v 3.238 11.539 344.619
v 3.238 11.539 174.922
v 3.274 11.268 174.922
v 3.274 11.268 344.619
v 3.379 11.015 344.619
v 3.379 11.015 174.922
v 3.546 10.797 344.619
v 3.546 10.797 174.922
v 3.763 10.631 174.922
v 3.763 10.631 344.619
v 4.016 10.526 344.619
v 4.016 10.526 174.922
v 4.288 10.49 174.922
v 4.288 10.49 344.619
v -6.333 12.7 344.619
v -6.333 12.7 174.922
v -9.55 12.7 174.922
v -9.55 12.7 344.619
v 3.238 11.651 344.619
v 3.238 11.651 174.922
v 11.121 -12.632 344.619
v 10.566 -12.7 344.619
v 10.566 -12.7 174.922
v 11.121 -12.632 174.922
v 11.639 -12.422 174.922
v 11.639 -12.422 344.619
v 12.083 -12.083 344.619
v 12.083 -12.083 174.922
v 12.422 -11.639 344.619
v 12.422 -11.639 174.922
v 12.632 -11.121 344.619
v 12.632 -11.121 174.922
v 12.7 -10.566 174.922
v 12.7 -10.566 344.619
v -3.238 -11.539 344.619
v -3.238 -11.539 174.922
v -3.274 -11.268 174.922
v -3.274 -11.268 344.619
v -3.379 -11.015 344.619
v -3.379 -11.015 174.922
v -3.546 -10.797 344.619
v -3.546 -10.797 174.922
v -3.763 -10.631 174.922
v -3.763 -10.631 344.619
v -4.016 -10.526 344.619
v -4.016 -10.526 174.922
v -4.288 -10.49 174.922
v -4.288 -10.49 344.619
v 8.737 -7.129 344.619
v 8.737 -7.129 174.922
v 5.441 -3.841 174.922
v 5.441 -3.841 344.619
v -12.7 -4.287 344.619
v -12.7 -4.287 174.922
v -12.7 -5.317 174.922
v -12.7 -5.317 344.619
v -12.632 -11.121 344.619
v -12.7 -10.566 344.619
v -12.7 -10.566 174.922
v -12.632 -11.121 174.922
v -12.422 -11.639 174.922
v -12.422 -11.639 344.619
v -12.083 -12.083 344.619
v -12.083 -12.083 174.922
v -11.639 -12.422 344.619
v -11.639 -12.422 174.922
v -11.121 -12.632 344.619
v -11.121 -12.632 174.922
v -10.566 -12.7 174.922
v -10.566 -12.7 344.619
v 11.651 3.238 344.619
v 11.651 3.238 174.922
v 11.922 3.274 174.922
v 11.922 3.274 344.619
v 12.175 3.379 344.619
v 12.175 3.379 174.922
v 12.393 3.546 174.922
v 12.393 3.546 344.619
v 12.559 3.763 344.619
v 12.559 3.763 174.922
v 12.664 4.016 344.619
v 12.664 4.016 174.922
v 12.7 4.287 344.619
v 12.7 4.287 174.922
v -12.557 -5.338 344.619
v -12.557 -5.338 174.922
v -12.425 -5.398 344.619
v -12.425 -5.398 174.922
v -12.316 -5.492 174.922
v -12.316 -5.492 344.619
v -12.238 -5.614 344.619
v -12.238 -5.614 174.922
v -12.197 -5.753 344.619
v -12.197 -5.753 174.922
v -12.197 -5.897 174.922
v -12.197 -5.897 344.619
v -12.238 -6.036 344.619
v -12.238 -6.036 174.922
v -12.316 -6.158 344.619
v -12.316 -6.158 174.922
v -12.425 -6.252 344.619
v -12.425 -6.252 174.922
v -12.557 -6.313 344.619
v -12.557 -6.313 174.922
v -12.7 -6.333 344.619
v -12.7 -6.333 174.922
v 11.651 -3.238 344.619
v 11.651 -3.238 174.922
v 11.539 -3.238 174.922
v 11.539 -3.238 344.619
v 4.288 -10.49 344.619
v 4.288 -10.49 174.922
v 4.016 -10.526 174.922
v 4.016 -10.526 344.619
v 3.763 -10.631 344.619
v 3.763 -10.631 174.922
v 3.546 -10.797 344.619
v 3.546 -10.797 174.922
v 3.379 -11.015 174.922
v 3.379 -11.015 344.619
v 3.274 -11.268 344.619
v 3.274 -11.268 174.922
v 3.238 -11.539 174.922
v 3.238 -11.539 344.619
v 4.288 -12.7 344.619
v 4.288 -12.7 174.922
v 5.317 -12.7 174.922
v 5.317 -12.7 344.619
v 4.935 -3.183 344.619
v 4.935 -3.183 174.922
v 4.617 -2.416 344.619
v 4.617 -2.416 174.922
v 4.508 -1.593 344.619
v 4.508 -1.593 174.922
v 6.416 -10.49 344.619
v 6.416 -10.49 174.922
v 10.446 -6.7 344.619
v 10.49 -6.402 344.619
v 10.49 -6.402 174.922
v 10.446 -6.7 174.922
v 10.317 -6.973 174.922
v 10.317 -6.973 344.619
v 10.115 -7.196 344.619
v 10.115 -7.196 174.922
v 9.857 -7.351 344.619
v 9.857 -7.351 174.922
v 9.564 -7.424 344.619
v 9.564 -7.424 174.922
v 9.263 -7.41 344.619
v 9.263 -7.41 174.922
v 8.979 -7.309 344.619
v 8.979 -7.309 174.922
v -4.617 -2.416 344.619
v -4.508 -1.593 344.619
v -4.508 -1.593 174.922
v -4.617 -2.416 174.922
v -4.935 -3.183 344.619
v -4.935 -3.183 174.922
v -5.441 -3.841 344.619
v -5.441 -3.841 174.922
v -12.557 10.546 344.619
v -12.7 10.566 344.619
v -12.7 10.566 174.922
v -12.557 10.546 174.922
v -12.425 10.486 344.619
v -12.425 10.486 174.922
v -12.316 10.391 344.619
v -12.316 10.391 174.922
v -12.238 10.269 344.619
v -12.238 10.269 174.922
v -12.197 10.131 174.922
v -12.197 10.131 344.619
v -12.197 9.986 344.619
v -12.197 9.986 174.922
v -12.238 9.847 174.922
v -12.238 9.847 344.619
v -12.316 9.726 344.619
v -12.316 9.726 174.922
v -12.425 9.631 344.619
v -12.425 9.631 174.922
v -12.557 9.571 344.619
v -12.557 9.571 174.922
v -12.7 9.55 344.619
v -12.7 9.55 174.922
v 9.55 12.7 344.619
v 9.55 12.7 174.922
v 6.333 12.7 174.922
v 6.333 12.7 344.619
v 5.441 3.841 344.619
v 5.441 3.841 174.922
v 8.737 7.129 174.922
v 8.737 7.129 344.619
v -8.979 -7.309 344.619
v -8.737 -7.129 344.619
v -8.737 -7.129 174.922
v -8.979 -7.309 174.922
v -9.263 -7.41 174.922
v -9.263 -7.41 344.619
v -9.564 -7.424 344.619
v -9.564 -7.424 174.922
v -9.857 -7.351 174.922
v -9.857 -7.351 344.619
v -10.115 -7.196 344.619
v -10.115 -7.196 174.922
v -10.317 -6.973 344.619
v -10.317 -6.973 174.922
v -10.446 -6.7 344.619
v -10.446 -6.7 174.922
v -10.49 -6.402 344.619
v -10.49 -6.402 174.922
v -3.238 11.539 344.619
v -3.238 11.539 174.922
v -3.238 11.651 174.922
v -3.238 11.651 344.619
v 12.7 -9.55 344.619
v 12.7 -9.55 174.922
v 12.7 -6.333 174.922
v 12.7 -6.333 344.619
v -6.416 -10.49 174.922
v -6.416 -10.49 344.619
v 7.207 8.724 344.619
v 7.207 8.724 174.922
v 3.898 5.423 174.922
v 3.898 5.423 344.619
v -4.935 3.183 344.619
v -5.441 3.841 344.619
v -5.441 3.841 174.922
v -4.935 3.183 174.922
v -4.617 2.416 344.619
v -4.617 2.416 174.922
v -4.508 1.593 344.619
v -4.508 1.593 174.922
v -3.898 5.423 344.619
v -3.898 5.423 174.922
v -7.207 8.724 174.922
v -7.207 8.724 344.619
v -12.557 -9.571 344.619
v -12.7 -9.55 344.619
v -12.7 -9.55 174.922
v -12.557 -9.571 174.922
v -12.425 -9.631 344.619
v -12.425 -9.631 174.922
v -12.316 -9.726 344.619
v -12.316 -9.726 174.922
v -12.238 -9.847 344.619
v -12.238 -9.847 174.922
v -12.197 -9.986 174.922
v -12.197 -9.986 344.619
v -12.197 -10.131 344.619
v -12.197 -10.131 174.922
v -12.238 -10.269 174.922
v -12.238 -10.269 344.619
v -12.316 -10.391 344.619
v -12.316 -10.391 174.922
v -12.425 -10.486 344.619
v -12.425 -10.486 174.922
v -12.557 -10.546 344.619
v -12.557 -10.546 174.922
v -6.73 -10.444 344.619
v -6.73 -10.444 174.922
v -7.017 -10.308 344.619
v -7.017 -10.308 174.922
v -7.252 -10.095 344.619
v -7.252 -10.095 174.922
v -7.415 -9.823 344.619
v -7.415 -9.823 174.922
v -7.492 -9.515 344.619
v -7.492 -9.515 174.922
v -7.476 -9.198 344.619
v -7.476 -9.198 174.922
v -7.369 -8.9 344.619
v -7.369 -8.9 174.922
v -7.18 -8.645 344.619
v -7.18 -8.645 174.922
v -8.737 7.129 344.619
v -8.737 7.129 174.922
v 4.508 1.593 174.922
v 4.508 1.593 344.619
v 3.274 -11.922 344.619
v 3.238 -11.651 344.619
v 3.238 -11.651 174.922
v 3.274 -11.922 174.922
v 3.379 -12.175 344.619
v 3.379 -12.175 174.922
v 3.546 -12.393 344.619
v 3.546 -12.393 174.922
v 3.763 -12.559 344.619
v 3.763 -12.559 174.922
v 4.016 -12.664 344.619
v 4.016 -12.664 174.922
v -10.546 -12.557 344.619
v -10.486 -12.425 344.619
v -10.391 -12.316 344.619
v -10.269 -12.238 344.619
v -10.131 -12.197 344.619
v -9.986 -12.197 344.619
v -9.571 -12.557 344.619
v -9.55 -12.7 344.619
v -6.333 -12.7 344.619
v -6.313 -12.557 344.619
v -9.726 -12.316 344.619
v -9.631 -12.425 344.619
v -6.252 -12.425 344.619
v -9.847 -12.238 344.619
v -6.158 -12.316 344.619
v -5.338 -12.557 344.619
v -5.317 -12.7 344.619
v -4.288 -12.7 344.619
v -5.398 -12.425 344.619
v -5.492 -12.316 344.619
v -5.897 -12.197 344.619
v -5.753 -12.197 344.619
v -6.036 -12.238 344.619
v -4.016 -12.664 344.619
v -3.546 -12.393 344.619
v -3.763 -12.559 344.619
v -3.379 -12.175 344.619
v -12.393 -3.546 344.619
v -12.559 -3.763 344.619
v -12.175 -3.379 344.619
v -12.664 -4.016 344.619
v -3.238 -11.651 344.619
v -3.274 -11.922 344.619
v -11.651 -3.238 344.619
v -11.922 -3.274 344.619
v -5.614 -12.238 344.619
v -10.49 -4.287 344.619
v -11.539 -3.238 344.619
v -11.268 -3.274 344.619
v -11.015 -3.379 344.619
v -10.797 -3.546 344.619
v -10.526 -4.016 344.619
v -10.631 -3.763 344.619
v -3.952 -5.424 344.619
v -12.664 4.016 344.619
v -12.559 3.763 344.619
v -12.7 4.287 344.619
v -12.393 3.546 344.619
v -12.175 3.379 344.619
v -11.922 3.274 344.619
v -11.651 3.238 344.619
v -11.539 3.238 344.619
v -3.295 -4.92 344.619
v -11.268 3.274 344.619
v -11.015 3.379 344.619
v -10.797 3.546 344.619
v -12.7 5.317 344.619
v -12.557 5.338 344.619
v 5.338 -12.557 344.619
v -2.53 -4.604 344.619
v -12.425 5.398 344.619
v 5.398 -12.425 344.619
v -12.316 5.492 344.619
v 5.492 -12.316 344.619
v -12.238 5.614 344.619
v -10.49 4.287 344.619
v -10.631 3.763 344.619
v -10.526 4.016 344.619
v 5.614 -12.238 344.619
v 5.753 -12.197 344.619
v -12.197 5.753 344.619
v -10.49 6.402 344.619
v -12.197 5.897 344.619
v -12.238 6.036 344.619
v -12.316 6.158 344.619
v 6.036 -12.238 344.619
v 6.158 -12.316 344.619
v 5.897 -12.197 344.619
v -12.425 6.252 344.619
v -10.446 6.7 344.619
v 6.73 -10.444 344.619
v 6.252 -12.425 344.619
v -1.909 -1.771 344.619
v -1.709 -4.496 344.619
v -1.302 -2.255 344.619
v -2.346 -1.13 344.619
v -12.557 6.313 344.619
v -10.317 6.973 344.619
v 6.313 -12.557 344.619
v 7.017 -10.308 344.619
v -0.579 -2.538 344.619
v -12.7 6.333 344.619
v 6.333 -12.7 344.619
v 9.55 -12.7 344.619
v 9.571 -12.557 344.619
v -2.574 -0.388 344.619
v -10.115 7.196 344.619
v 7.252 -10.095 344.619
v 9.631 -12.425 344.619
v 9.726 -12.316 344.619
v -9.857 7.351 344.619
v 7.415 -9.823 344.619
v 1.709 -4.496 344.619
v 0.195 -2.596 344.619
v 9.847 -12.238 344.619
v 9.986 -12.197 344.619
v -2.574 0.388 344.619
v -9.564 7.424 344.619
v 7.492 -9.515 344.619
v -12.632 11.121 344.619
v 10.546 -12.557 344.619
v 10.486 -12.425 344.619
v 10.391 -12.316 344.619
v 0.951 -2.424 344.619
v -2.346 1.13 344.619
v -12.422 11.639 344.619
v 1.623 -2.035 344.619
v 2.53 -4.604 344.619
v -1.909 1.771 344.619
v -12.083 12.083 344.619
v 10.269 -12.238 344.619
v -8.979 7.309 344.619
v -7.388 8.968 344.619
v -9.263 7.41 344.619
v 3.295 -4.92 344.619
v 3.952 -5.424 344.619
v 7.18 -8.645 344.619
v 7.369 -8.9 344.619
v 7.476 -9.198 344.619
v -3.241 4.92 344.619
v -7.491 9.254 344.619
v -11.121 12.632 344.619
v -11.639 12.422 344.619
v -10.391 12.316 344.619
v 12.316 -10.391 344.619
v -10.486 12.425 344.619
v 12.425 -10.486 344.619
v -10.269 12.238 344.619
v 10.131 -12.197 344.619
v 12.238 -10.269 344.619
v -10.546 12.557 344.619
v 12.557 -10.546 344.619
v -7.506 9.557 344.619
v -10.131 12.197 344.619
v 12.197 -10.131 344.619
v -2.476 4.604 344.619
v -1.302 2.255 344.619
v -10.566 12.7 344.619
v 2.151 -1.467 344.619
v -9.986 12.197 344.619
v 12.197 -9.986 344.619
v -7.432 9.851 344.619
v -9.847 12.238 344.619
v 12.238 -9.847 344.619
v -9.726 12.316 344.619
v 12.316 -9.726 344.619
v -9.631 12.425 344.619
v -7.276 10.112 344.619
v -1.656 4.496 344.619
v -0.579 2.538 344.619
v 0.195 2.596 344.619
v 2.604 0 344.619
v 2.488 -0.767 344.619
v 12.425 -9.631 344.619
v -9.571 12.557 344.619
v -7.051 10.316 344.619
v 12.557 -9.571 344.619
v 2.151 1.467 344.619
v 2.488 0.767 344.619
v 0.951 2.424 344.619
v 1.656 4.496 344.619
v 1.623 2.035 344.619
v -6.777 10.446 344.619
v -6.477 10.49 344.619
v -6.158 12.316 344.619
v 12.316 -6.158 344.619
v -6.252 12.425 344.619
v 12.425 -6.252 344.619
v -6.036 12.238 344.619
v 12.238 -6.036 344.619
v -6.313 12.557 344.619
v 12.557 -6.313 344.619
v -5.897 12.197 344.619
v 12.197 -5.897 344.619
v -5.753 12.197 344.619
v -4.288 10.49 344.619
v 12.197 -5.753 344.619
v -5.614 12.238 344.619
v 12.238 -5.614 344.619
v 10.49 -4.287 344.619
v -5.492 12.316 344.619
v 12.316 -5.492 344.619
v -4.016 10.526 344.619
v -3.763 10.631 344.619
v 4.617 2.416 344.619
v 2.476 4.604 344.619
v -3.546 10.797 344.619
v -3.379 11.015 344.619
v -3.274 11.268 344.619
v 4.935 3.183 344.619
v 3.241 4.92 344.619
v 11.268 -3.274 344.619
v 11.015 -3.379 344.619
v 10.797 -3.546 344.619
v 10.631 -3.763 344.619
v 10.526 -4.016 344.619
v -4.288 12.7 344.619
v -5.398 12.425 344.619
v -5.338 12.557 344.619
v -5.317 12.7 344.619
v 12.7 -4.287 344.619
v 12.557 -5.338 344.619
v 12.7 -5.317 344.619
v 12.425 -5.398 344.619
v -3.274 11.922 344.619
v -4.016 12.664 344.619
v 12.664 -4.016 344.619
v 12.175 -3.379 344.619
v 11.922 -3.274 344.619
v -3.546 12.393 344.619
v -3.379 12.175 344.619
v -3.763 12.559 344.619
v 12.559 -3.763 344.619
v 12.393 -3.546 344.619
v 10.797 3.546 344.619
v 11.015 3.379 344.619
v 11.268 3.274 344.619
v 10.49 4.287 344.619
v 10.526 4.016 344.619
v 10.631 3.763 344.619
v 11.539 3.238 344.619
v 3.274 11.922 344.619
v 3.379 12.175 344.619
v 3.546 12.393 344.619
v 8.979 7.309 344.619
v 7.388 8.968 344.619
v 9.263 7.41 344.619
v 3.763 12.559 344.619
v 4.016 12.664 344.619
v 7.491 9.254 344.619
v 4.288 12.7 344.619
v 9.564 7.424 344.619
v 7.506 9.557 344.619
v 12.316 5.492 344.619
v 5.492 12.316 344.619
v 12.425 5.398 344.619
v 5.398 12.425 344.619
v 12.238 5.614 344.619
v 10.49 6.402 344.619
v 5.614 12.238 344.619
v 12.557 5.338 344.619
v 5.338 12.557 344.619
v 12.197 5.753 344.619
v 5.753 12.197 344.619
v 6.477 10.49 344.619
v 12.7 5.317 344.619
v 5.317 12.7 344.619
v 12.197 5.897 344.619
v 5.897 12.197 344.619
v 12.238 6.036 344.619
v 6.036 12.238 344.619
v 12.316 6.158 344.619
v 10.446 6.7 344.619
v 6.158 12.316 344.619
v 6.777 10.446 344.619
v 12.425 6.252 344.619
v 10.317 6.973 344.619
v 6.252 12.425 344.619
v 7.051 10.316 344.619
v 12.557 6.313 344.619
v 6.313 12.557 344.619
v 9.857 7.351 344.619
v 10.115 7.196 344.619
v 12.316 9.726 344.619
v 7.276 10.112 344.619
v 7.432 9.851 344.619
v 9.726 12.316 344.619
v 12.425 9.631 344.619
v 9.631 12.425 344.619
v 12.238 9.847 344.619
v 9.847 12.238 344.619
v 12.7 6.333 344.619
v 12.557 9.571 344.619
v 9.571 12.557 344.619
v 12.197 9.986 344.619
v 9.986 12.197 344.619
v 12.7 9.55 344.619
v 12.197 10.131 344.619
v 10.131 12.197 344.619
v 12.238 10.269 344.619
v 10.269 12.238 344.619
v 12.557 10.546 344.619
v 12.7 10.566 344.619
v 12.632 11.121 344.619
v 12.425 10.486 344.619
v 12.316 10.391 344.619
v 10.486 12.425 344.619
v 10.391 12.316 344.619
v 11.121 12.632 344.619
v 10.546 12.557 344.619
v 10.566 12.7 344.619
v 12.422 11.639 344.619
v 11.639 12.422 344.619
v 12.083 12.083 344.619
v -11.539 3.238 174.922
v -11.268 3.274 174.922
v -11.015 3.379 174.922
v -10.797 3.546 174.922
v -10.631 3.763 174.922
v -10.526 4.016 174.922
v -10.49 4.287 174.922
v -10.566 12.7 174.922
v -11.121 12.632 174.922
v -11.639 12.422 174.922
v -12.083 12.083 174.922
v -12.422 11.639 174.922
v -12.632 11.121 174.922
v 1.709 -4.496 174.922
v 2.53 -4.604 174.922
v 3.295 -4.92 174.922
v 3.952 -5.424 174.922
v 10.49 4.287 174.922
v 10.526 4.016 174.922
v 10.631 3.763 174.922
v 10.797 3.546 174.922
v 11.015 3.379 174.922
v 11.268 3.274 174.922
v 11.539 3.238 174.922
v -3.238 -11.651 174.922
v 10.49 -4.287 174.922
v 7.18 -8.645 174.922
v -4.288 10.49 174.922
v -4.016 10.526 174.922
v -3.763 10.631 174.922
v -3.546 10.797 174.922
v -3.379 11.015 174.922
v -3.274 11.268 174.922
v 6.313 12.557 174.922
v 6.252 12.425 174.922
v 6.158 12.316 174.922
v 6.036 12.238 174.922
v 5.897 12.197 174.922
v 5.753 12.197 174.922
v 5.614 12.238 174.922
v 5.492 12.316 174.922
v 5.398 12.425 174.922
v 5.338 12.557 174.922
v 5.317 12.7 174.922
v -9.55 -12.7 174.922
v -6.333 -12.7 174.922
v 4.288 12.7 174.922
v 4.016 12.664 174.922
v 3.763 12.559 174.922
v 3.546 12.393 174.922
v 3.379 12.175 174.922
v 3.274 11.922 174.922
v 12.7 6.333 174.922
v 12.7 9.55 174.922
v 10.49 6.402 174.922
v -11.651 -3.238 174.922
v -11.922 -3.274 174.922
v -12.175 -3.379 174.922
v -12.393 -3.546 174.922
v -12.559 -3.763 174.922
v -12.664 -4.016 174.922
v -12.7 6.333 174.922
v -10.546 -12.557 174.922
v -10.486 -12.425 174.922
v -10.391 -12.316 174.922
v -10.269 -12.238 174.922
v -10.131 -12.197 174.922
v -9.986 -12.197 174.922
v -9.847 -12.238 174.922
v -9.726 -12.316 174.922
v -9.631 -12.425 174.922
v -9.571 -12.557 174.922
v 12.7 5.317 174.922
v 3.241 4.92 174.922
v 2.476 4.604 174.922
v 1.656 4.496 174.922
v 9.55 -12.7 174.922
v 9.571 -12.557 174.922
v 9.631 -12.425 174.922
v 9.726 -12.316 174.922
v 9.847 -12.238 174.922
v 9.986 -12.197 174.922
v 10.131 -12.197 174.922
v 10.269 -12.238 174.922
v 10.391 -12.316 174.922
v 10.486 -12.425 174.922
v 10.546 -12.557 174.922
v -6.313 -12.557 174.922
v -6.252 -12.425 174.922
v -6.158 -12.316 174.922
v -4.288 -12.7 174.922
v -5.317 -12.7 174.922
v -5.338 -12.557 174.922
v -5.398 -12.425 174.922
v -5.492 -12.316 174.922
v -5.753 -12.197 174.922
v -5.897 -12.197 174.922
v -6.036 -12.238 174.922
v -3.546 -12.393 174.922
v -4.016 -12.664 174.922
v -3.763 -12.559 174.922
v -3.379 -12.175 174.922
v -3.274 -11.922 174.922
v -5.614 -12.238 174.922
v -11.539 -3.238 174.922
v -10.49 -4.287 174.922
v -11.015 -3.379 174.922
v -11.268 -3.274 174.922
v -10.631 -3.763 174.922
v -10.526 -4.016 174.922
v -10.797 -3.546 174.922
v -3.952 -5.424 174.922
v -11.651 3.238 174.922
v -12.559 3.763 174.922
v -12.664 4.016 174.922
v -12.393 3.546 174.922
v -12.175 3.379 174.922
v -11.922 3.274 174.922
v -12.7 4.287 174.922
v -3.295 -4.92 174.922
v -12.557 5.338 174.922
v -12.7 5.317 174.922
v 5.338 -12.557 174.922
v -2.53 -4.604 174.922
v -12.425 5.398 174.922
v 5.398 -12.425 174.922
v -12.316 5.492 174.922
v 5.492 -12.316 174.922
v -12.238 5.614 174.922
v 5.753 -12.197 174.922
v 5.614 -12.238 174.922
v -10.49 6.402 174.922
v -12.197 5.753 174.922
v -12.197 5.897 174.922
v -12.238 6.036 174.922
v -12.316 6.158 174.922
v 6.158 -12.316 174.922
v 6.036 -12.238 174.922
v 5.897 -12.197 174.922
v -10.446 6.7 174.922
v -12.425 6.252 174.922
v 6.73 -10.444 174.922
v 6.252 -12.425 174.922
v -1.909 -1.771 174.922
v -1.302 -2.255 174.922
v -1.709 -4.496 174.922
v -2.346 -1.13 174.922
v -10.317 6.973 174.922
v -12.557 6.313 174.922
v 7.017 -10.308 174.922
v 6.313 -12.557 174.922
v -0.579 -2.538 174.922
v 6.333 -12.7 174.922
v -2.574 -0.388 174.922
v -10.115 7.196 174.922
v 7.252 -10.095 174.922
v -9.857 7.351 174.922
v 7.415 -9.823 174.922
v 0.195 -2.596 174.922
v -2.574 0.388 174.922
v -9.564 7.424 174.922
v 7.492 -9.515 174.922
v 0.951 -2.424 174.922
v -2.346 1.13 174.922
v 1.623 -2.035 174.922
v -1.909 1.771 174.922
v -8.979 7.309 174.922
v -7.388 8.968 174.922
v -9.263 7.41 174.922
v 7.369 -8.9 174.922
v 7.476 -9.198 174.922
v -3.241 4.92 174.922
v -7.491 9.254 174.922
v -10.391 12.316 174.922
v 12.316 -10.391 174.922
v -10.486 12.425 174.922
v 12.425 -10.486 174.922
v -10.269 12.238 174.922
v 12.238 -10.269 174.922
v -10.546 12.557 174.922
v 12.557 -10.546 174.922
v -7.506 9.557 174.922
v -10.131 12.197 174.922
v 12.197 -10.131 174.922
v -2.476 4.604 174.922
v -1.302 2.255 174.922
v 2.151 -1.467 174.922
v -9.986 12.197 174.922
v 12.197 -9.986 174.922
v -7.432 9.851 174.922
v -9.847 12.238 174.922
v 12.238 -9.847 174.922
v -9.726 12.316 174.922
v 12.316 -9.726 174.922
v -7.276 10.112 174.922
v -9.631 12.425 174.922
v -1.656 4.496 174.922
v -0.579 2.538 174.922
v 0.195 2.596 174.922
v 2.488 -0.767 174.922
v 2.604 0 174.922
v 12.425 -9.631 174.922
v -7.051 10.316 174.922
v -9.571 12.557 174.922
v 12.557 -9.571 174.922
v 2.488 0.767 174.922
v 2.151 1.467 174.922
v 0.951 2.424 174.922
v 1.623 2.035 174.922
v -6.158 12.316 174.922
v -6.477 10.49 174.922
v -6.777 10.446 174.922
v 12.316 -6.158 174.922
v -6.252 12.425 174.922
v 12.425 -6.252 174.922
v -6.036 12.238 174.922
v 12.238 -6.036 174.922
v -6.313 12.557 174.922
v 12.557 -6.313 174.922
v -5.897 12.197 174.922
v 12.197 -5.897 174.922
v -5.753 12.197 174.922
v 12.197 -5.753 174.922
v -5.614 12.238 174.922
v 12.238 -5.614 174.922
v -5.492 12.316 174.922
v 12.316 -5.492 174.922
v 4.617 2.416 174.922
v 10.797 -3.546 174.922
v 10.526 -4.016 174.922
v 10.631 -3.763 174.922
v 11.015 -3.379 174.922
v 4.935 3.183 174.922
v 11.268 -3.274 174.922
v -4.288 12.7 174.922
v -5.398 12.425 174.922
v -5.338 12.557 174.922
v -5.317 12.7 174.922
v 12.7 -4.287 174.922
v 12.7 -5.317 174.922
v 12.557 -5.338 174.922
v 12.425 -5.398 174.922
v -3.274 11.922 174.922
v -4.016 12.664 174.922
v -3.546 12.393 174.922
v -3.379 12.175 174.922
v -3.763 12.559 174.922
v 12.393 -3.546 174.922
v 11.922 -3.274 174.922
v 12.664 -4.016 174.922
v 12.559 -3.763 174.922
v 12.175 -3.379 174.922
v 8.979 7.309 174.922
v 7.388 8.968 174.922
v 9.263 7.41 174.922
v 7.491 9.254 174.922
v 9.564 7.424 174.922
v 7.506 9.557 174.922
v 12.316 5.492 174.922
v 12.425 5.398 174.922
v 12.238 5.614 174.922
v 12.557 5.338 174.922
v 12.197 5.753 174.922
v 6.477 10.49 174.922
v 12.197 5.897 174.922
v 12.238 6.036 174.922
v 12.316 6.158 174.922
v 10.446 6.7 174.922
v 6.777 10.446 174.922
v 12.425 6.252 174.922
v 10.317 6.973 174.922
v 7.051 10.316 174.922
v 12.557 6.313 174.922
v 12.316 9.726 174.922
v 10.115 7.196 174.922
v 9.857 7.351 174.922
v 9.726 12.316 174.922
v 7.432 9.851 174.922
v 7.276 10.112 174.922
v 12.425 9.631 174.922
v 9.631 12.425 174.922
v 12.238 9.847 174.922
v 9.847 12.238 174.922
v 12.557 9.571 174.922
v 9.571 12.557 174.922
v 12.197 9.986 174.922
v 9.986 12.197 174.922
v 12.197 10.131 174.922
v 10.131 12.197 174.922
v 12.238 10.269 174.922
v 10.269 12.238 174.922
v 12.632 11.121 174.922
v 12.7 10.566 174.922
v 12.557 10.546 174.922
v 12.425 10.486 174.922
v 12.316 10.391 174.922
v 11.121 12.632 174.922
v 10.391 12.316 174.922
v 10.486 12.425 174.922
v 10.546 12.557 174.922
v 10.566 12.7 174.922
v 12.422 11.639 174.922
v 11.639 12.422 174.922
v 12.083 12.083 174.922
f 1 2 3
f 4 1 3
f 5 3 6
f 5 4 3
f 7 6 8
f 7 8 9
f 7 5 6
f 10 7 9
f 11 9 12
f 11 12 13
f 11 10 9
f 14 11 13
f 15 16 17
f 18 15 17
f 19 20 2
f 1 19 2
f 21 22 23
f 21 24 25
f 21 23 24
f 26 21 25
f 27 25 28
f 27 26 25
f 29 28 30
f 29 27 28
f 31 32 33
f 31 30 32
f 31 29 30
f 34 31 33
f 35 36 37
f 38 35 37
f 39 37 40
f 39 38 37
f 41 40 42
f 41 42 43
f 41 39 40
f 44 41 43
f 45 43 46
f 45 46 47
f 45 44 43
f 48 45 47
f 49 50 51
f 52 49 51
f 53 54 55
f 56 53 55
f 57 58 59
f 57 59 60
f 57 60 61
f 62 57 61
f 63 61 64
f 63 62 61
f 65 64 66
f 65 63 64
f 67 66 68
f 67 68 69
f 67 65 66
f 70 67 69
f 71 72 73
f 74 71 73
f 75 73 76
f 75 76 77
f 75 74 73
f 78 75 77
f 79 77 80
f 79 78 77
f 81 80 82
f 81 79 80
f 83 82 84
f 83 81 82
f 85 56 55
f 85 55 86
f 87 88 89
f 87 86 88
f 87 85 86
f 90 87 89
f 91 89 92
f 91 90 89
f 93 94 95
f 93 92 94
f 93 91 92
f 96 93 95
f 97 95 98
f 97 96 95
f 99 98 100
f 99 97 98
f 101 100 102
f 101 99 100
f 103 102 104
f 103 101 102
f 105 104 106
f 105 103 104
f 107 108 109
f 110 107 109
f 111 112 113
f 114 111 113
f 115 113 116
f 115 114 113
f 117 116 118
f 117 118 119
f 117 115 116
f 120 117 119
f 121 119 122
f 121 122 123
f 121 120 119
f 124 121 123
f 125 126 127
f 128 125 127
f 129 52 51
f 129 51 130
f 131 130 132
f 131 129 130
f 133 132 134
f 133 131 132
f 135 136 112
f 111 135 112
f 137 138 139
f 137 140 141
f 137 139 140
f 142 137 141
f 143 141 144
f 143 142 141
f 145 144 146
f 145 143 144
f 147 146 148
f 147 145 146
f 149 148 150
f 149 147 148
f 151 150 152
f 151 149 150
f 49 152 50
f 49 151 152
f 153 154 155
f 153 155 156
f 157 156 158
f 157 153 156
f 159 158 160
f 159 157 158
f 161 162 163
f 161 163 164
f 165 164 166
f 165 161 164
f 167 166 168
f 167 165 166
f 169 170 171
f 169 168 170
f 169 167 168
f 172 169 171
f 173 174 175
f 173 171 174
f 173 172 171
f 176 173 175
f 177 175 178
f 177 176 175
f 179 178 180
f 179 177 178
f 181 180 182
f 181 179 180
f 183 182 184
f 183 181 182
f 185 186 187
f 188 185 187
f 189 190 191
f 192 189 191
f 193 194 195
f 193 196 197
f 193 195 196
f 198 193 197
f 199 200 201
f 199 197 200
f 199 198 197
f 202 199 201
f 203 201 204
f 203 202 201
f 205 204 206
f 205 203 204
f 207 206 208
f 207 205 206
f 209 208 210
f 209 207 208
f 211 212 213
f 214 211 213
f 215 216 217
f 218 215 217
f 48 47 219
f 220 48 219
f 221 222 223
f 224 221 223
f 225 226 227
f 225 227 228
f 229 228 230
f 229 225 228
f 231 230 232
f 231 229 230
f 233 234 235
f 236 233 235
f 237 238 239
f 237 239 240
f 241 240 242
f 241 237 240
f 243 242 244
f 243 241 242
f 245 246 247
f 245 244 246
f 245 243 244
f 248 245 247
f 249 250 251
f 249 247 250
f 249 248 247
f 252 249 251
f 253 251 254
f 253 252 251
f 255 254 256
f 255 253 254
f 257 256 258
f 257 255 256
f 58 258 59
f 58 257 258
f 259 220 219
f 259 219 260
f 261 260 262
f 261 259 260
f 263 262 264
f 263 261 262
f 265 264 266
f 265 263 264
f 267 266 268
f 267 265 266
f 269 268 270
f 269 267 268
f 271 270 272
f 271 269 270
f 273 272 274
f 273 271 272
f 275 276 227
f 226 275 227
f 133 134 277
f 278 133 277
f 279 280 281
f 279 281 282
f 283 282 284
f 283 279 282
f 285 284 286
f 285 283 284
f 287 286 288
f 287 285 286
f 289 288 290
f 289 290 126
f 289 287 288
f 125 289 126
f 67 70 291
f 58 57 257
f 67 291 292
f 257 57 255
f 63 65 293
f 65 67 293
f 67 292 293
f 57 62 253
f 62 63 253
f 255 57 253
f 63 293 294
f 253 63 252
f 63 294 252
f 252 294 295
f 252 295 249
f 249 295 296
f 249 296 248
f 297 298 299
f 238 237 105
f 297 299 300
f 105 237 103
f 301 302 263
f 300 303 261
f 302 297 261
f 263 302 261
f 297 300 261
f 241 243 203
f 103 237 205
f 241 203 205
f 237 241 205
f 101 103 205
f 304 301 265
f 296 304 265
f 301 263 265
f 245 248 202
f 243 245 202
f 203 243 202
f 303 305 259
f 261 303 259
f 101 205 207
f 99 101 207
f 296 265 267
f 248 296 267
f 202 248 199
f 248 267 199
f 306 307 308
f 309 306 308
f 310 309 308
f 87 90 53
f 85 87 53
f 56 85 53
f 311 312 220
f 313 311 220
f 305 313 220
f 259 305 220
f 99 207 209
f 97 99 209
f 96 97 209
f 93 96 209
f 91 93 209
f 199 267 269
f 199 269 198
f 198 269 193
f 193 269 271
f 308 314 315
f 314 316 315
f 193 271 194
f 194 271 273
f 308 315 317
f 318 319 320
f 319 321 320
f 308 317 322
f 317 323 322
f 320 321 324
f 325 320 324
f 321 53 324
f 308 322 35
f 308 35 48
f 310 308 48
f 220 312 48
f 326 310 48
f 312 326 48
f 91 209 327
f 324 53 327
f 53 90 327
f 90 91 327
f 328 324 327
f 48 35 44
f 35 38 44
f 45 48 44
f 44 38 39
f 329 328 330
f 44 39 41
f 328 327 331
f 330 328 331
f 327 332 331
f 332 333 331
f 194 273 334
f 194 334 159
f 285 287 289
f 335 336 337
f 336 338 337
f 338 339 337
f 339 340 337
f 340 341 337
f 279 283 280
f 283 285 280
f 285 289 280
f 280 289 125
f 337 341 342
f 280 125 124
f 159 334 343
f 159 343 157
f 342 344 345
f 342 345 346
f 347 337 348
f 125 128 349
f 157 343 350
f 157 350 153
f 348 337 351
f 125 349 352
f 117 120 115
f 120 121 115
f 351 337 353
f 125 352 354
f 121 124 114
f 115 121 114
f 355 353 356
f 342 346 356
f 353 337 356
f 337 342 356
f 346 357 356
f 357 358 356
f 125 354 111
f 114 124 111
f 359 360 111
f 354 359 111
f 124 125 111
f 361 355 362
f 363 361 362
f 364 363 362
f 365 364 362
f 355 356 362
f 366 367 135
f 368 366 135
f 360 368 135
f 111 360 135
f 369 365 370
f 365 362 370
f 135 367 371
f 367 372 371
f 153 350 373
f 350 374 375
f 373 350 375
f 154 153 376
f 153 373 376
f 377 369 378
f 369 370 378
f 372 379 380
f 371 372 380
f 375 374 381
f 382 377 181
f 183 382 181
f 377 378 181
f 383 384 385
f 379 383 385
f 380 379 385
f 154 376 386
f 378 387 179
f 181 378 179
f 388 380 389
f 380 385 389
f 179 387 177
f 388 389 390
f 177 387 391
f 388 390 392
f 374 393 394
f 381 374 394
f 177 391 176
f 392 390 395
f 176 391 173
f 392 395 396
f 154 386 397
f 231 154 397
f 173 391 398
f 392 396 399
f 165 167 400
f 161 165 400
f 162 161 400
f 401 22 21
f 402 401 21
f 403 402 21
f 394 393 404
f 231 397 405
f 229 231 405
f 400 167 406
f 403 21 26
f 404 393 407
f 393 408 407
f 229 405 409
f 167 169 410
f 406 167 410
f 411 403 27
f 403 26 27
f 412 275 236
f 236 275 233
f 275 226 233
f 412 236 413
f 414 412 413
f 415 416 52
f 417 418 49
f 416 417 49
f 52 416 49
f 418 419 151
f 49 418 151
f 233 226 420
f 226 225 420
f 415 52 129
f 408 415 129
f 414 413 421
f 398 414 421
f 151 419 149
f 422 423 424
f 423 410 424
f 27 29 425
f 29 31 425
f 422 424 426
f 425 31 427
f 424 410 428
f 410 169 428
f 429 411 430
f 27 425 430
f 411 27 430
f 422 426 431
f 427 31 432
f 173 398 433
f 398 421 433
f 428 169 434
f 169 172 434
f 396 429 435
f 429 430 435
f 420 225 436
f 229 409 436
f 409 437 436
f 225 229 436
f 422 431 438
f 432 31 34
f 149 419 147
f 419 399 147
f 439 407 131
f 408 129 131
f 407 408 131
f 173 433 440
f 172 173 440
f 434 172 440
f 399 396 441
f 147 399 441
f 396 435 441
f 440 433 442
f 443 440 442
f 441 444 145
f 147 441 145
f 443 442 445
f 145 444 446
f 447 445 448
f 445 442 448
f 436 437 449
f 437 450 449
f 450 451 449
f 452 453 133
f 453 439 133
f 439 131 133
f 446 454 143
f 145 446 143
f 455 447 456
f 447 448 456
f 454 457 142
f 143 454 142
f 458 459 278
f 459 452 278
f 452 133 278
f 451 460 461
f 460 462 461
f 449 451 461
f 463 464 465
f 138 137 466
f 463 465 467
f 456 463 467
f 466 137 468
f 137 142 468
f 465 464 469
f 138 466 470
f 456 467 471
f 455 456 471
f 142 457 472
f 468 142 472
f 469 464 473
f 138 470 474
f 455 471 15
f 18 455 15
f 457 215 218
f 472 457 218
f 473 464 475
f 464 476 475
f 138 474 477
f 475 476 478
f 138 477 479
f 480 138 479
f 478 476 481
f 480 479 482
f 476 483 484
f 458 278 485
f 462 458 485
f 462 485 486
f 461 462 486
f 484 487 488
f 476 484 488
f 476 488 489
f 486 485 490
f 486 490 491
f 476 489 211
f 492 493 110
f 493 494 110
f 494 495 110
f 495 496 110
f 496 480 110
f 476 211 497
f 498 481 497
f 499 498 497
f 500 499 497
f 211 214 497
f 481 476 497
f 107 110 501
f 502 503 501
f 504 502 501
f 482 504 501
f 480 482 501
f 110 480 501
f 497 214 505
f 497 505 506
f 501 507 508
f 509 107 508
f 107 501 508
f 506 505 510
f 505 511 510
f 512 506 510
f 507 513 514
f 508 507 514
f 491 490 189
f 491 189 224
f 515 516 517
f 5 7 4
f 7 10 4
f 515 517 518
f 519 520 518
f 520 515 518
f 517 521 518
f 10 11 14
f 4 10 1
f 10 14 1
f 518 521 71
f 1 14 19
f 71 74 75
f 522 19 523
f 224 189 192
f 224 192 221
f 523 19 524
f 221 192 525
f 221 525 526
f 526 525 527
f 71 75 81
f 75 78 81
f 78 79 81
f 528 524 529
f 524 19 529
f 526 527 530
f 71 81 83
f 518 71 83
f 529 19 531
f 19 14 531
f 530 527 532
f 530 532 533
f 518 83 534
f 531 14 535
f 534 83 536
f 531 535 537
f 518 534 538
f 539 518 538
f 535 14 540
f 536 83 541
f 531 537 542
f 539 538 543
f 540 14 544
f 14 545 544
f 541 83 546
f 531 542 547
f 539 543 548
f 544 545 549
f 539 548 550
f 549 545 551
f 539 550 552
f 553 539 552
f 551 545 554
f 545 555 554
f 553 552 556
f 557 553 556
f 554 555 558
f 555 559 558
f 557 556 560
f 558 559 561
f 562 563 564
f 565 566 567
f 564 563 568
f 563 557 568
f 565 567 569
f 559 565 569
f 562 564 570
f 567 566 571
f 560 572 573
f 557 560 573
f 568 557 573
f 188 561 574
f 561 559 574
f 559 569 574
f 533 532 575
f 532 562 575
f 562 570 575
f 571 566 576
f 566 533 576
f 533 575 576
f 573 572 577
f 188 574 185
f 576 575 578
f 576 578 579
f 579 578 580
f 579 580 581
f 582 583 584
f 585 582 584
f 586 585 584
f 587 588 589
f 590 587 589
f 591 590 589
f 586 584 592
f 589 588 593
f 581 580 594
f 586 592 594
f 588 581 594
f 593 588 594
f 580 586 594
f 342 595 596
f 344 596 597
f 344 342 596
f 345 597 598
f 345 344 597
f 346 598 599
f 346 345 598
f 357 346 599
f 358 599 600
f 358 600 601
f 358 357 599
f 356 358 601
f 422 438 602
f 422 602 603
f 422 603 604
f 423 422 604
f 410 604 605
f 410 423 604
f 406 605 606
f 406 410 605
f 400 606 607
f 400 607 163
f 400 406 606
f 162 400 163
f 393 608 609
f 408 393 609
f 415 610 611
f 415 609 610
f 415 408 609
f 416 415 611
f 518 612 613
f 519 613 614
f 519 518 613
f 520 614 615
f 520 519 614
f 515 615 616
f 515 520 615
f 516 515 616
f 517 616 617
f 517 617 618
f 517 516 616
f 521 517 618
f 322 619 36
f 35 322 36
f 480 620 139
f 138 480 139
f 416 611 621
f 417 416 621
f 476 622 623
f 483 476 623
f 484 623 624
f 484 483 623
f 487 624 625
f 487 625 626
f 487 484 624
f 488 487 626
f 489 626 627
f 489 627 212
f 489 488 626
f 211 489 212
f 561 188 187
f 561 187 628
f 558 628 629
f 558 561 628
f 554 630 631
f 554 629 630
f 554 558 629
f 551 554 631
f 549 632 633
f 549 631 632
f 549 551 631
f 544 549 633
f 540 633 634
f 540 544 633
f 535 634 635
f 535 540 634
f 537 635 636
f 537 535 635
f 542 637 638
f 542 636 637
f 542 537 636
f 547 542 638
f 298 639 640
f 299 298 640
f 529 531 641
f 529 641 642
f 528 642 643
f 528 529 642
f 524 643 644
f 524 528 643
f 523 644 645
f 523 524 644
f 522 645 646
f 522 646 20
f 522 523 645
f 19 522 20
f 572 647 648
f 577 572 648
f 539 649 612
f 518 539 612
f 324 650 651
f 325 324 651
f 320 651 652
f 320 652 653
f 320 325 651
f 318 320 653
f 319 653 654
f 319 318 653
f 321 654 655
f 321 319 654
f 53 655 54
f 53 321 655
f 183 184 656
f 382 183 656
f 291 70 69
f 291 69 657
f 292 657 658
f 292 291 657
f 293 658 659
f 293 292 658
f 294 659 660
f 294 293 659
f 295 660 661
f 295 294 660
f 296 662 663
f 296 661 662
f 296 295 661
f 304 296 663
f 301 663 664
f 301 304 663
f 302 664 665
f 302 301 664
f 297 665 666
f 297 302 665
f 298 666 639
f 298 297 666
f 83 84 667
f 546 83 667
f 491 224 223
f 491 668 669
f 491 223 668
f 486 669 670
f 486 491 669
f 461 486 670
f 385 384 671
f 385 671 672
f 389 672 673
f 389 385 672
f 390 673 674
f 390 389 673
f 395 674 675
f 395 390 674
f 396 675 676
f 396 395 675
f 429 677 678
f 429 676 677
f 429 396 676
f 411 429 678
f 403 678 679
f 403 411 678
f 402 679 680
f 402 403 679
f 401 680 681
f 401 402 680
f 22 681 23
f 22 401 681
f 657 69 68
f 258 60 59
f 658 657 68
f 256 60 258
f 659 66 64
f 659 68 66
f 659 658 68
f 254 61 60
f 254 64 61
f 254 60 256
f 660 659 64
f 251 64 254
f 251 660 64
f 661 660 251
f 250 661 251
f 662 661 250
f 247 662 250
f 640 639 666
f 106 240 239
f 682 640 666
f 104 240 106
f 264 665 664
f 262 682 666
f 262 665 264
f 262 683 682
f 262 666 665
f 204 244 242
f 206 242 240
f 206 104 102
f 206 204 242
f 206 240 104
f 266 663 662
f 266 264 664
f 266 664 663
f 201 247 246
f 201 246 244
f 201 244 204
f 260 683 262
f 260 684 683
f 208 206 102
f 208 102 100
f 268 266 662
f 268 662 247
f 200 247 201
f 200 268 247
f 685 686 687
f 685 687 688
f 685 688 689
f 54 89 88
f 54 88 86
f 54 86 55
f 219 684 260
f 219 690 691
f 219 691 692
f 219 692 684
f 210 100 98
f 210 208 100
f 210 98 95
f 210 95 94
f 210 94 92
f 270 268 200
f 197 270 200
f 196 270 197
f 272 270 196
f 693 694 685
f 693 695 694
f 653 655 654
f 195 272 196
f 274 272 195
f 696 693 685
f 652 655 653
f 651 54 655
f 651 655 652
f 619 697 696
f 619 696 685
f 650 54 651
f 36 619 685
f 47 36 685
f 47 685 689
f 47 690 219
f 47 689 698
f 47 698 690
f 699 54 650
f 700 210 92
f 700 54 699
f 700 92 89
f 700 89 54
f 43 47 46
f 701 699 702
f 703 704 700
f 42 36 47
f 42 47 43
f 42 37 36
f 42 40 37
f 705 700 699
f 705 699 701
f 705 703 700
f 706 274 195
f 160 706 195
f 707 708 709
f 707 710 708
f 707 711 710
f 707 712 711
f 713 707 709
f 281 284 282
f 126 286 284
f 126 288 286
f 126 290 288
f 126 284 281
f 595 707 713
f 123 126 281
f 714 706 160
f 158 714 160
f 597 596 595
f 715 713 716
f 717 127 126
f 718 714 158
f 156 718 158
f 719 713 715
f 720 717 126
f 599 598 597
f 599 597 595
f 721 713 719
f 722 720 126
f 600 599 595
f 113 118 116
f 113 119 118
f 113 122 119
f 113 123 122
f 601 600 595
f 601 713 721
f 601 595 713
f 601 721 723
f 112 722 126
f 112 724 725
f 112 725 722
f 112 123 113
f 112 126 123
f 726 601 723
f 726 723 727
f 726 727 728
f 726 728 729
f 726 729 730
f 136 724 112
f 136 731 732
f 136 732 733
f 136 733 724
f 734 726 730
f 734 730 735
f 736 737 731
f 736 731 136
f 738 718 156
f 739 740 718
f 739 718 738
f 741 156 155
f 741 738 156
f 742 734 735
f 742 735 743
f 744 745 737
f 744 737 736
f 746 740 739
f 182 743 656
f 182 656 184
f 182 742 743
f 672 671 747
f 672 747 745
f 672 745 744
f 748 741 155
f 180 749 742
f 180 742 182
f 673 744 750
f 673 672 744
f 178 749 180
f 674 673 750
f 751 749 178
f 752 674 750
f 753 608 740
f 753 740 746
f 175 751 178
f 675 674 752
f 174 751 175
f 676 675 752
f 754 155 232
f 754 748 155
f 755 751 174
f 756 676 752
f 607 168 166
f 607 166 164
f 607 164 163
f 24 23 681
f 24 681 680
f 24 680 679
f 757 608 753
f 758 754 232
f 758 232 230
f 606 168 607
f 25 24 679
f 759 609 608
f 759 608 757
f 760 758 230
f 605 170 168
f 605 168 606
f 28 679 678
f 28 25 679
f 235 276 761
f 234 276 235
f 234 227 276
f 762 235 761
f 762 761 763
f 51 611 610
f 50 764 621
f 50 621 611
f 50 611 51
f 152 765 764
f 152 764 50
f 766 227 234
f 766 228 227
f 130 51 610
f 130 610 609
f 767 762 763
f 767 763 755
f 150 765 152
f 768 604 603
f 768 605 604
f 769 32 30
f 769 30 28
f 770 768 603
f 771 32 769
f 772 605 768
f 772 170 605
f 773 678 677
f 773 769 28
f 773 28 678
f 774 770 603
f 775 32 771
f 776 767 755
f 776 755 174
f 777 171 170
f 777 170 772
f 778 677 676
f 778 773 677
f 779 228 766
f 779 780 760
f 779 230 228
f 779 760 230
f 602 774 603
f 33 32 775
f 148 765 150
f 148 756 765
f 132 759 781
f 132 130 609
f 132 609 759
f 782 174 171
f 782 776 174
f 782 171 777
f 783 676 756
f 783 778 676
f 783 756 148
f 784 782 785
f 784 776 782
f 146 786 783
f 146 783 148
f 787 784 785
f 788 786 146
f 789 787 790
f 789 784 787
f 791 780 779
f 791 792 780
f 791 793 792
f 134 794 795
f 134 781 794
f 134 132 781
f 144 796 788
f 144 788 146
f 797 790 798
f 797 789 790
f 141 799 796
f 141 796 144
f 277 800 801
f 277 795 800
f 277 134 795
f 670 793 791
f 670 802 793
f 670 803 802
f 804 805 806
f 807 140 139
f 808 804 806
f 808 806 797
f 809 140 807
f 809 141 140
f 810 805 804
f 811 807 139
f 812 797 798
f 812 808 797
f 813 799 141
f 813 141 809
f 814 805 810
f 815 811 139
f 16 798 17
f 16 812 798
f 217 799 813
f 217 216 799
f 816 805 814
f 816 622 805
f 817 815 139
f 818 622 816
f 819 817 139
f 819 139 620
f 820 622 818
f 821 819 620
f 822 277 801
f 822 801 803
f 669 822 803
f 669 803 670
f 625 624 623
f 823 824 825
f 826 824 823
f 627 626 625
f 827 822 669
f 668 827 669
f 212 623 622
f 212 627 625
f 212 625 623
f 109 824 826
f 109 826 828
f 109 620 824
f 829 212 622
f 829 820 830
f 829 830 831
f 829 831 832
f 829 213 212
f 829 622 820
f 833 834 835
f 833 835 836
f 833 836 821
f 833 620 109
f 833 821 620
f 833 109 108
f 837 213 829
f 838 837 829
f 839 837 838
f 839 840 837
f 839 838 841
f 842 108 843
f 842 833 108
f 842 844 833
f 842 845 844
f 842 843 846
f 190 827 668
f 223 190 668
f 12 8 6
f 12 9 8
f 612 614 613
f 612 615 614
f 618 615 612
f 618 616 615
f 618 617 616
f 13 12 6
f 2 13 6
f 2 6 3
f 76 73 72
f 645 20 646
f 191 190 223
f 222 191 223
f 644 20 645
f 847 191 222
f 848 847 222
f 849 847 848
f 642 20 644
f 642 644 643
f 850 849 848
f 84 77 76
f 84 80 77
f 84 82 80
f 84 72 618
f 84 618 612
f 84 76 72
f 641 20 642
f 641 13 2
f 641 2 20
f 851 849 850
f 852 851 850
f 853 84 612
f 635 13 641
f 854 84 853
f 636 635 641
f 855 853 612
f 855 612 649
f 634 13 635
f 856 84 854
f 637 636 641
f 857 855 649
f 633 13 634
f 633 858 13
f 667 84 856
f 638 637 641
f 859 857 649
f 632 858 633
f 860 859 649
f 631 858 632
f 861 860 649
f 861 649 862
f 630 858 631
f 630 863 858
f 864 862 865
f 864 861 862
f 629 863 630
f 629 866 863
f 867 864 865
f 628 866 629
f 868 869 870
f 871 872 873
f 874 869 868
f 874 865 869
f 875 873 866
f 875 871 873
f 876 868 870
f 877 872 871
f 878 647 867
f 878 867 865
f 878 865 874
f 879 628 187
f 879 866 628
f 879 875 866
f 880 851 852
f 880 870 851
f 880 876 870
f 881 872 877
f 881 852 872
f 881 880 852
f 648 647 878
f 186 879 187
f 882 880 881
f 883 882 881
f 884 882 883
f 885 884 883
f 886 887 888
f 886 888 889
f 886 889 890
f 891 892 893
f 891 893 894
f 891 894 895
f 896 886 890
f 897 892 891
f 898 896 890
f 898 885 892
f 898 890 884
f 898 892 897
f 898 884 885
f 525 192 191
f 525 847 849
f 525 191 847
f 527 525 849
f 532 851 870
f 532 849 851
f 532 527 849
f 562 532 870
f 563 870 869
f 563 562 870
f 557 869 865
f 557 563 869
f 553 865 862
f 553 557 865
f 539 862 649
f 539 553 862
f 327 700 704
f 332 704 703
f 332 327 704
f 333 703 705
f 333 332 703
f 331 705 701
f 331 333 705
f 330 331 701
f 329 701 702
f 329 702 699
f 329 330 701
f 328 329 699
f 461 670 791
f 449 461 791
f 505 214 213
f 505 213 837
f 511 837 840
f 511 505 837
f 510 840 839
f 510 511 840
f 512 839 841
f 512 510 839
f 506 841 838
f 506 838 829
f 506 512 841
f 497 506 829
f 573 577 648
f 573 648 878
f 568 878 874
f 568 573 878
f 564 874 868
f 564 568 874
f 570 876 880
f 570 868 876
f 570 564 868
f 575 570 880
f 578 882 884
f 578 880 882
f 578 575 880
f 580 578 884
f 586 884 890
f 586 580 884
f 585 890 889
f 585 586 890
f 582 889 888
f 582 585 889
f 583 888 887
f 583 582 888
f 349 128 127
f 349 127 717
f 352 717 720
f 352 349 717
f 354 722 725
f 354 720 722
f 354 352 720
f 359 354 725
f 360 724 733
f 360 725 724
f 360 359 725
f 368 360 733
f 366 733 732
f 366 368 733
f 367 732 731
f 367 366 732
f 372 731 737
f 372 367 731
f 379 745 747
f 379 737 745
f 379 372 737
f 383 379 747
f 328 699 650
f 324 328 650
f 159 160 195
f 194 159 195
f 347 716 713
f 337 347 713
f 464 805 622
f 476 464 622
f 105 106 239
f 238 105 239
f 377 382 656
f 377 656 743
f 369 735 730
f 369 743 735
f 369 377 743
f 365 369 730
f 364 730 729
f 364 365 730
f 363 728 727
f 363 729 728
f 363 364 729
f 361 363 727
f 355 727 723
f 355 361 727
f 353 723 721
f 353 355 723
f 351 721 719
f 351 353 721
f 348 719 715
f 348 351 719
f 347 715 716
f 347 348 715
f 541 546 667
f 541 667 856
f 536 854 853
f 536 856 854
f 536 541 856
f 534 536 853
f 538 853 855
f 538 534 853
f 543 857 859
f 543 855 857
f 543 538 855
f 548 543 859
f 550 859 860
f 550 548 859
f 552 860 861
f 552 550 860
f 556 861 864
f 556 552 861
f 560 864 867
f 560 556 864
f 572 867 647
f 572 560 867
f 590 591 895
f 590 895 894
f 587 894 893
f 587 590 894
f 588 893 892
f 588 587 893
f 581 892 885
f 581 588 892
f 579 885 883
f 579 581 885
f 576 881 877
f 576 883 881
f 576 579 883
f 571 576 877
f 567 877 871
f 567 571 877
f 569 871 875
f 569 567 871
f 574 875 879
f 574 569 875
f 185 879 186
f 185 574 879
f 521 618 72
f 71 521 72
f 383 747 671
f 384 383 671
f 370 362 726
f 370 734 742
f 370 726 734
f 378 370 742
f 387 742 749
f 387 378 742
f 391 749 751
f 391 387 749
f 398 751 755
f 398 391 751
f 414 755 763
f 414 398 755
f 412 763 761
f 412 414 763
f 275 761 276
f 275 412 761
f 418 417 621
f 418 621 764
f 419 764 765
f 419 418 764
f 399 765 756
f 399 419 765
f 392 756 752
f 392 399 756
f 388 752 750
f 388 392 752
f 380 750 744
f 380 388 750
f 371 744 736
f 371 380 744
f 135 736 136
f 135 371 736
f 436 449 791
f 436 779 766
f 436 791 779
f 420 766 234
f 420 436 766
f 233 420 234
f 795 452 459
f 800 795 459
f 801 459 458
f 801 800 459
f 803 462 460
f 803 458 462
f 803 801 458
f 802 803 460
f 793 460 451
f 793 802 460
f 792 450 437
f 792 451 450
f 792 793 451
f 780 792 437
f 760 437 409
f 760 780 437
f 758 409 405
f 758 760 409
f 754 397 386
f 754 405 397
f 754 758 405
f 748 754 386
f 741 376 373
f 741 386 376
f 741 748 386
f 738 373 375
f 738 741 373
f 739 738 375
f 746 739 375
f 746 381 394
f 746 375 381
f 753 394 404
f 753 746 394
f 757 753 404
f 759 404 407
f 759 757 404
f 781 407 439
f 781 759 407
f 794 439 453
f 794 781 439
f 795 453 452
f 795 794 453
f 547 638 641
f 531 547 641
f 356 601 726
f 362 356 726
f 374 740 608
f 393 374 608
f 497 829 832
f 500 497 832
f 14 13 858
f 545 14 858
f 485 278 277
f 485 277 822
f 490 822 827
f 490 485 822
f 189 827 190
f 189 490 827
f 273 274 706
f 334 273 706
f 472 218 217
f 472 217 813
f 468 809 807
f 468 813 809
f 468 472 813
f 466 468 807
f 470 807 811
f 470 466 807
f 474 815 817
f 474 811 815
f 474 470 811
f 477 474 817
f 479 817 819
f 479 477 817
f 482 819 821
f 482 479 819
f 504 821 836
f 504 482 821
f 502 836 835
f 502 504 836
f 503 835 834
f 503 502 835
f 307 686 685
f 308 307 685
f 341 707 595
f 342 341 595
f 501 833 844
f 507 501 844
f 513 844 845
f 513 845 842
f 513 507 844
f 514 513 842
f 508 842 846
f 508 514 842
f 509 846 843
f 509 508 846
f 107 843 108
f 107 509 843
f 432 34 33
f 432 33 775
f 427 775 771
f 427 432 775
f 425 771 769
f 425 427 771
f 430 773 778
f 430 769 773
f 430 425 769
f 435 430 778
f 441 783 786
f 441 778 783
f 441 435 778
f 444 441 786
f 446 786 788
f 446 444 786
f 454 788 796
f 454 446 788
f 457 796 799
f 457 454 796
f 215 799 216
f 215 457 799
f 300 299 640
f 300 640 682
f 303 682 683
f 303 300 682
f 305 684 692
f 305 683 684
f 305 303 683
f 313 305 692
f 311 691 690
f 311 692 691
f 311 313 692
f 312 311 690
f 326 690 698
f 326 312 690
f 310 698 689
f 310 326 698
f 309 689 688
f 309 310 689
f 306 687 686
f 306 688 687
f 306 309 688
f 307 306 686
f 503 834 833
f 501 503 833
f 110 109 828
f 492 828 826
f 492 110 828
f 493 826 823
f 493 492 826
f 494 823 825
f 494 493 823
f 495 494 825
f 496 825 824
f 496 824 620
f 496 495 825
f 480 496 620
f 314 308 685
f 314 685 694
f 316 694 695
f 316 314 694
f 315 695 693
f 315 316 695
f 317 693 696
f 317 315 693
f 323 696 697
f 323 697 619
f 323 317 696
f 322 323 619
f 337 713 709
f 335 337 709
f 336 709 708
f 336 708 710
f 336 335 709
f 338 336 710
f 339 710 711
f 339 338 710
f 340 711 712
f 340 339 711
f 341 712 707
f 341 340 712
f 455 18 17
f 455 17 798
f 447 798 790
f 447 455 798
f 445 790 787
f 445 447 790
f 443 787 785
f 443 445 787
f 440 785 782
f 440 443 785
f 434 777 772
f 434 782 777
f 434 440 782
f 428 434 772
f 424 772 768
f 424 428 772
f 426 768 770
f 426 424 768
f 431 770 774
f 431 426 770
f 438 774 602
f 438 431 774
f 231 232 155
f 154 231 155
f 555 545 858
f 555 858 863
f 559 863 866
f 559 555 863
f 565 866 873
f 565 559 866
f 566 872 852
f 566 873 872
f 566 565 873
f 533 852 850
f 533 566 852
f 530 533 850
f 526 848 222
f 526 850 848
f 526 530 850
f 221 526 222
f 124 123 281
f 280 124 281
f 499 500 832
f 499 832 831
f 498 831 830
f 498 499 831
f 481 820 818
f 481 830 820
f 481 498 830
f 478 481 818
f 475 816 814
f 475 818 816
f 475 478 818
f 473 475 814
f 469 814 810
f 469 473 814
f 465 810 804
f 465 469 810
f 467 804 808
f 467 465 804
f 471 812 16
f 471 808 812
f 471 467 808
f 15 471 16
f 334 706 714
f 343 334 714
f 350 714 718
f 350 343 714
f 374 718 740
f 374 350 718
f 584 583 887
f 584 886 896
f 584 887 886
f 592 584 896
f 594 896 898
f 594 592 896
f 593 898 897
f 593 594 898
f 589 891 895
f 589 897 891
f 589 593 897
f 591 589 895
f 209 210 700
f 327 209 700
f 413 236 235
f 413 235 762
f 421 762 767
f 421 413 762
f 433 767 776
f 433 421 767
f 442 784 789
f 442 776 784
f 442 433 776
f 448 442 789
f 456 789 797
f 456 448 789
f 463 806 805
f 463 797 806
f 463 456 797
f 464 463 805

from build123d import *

# Parameters (mm, degrees)
SKETCH1_R           = 2.6035
BOSS_EXTRUDE1_DEPTH = 914.4
SKETCH2_W           = 573.8387108
SKETCH2_H           = 34.760821459
SKETCH2_W_2         = 1099.97900941
SKETCH2_H_2         = 36.169365112
CUT_EXTRUDE1_DEPTH  = 27.432


with BuildPart() as part:
    # Sketch1 → Boss-Extrude1 (new body, symmetric)
    with BuildSketch(Plane.XY):
        with BuildLine():
            Line((-7.179650497, -8.645192506), (-3.952270251, -5.423690499))
            ThreePointArc((-3.952270251, -5.423690499), (-2.922936451, -4.736929036), (-1.709253557, -4.4958))
            Line((-1.709253557, -4.4958), (1.709253557, -4.4958))
            ThreePointArc((1.709253557, -4.4958), (2.922936451, -4.736929036), (3.952270251, -5.423690499))
            Line((3.952270251, -5.423690499), (7.179650497, -8.645192506))
            ThreePointArc((7.179650497, -8.645192506), (7.41473083, -9.822813117), (6.416408329, -10.4902))
            Line((6.416408329, -10.4902), (4.287512407, -10.4902))
            ThreePointArc((4.287512407, -10.4902), (3.54574862, -10.79744862), (3.2385, -11.539212407))
            Line((3.2385, -11.539212407), (3.2385, -11.650987593))
            ThreePointArc((3.2385, -11.650987593), (3.54574862, -12.39275138), (4.287512407, -12.7))
            Line((4.287512407, -12.7), (5.317126718, -12.7))
            ThreePointArc((5.317126718, -12.7), (5.825126718, -12.192), (6.333126718, -12.7))
            Line((6.333126718, -12.7), (9.550443118, -12.7))
            ThreePointArc((9.550443118, -12.7), (10.058366869, -12.192000006), (10.566443095, -12.699847501))
            ThreePointArc((10.566443095, -12.699847501), (12.082537762, -12.08250727), (12.699846982, -10.566399977))
            ThreePointArc((12.699846982, -10.566399977), (12.192000006, -10.058323491), (12.7, -9.5504))
            Line((12.7, -9.5504), (12.7, -6.3330836))
            ThreePointArc((12.7, -6.3330836), (12.192, -5.8250836), (12.7, -5.3170836))
            Line((12.7, -5.3170836), (12.7, -4.287469289))
            ThreePointArc((12.7, -4.287469289), (12.39275138, -3.545705502), (11.650987593, -3.238456882))
            Line((11.650987593, -3.238456882), (11.539212407, -3.238456882))
            ThreePointArc((11.539212407, -3.238456882), (10.79744862, -3.545705502), (10.4902, -4.287469289))
            Line((10.4902, -4.287469289), (10.4902, -6.402089023))
            ThreePointArc((10.4902, -6.402089023), (9.856505071, -7.351067942), (8.737131347, -7.129408934))
            Line((8.737131347, -7.129408934), (5.441005833, -3.840816462))
            ThreePointArc((5.441005833, -3.840816462), (4.750877967, -2.809883091), (4.5085, -1.593185507))
            Line((4.5085, -1.593185507), (4.5085, 1.593185507))
            ThreePointArc((4.5085, 1.593185507), (4.750877967, 2.809883091), (5.441005833, 3.840816462))
            Line((5.441005833, 3.840816462), (8.737131347, 7.129408934))
            ThreePointArc((8.737131347, 7.129408934), (9.856505071, 7.351067942), (10.4902, 6.402089023))
            Line((10.4902, 6.402089023), (10.4902, 4.287469289))
            ThreePointArc((10.4902, 4.287469289), (10.79744862, 3.545705502), (11.539212407, 3.238456882))
            Line((11.539212407, 3.238456882), (11.650987593, 3.238456882))
            ThreePointArc((11.650987593, 3.238456882), (12.39275138, 3.545705502), (12.7, 4.287469289))
            Line((12.7, 4.287469289), (12.7, 5.3170836))
            ThreePointArc((12.7, 5.3170836), (12.192, 5.8250836), (12.7, 6.3330836))
            Line((12.7, 6.3330836), (12.7, 9.5504))
            ThreePointArc((12.7, 9.5504), (12.192000006, 10.058323491), (12.699846982, 10.566399977))
            ThreePointArc((12.699846982, 10.566399977), (12.082537762, 12.08250727), (10.566443095, 12.699847501))
            ThreePointArc((10.566443095, 12.699847501), (10.058366869, 12.192000006), (9.550443118, 12.7))
            Line((9.550443118, 12.7), (6.333126718, 12.7))
            ThreePointArc((6.333126718, 12.7), (5.825126718, 12.192), (5.317126718, 12.7))
            Line((5.317126718, 12.7), (4.287512407, 12.7))
            ThreePointArc((4.287512407, 12.7), (3.54574862, 12.39275138), (3.2385, 11.650987593))
            Line((3.2385, 11.650987593), (3.2385, 11.539212407))
            ThreePointArc((3.2385, 11.539212407), (3.54574862, 10.79744862), (4.287512407, 10.4902))
            Line((4.287512407, 10.4902), (6.476788598, 10.4902))
            ThreePointArc((6.476788598, 10.4902), (7.432222385, 9.85140422), (7.207036008, 8.724370562))
            Line((7.207036008, 8.724370562), (3.898272566, 5.423169045))
            ThreePointArc((3.898272566, 5.423169045), (2.869120213, 4.736787962), (1.655778399, 4.4958))
            Line((1.655778399, 4.4958), (-1.655778399, 4.4958))
            ThreePointArc((-1.655778399, 4.4958), (-2.869120213, 4.736787962), (-3.898272566, 5.423169045))
            Line((-3.898272566, 5.423169045), (-7.207036008, 8.724370562))
            ThreePointArc((-7.207036008, 8.724370562), (-7.432222385, 9.85140422), (-6.476788598, 10.4902))
            Line((-6.476788598, 10.4902), (-4.287512407, 10.4902))
            ThreePointArc((-4.287512407, 10.4902), (-3.54574862, 10.79744862), (-3.2385, 11.539212407))
            Line((-3.2385, 11.539212407), (-3.2385, 11.650987593))
            ThreePointArc((-3.2385, 11.650987593), (-3.54574862, 12.39275138), (-4.287512407, 12.7))
            Line((-4.287512407, 12.7), (-5.317126718, 12.7))
            ThreePointArc((-5.317126718, 12.7), (-5.825126718, 12.192), (-6.333126718, 12.7))
            Line((-6.333126718, 12.7), (-9.550443118, 12.7))
            ThreePointArc((-9.550443118, 12.7), (-10.058366869, 12.192000006), (-10.566443095, 12.699847501))
            ThreePointArc((-10.566443095, 12.699847501), (-12.082537762, 12.08250727), (-12.699846982, 10.566399977))
            ThreePointArc((-12.699846982, 10.566399977), (-12.192000006, 10.058323491), (-12.7, 9.5504))
            Line((-12.7, 9.5504), (-12.7, 6.3330836))
            ThreePointArc((-12.7, 6.3330836), (-12.192, 5.8250836), (-12.7, 5.3170836))
            Line((-12.7, 5.3170836), (-12.7, 4.287469289))
            ThreePointArc((-12.7, 4.287469289), (-12.39275138, 3.545705502), (-11.650987593, 3.238456882))
            Line((-11.650987593, 3.238456882), (-11.539212407, 3.238456882))
            ThreePointArc((-11.539212407, 3.238456882), (-10.79744862, 3.545705502), (-10.4902, 4.287469289))
            Line((-10.4902, 4.287469289), (-10.4902, 6.402089023))
            ThreePointArc((-10.4902, 6.402089023), (-9.856505071, 7.351067942), (-8.737131347, 7.129408934))
            Line((-8.737131347, 7.129408934), (-5.441005833, 3.840816462))
            ThreePointArc((-5.441005833, 3.840816462), (-4.750877967, 2.809883091), (-4.5085, 1.593185507))
            Line((-4.5085, 1.593185507), (-4.5085, -1.593185507))
            ThreePointArc((-4.5085, -1.593185507), (-4.750877967, -2.809883091), (-5.441005833, -3.840816462))
            Line((-5.441005833, -3.840816462), (-8.737131347, -7.129408934))
            ThreePointArc((-8.737131347, -7.129408934), (-9.856505071, -7.351067942), (-10.4902, -6.402089023))
            Line((-10.4902, -6.402089023), (-10.4902, -4.287469289))
            ThreePointArc((-10.4902, -4.287469289), (-10.79744862, -3.545705502), (-11.539212407, -3.238456882))
            Line((-11.539212407, -3.238456882), (-11.650987593, -3.238456882))
            ThreePointArc((-11.650987593, -3.238456882), (-12.39275138, -3.545705502), (-12.7, -4.287469289))
            Line((-12.7, -4.287469289), (-12.7, -5.3170836))
            ThreePointArc((-12.7, -5.3170836), (-12.192, -5.8250836), (-12.7, -6.3330836))
            Line((-12.7, -6.3330836), (-12.7, -9.5504))
            ThreePointArc((-12.7, -9.5504), (-12.192000006, -10.058323491), (-12.699846982, -10.566399977))
            ThreePointArc((-12.699846982, -10.566399977), (-12.082537762, -12.08250727), (-10.566443095, -12.699847501))
            ThreePointArc((-10.566443095, -12.699847501), (-10.058366869, -12.192000006), (-9.550443118, -12.7))
            Line((-9.550443118, -12.7), (-6.333126718, -12.7))
            ThreePointArc((-6.333126718, -12.7), (-5.825126718, -12.192), (-5.317126718, -12.7))
            Line((-5.317126718, -12.7), (-4.287512407, -12.7))
            ThreePointArc((-4.287512407, -12.7), (-3.54574862, -12.39275138), (-3.2385, -11.650987593))
            Line((-3.2385, -11.650987593), (-3.2385, -11.539212407))
            ThreePointArc((-3.2385, -11.539212407), (-3.54574862, -10.79744862), (-4.287512407, -10.4902))
            Line((-4.287512407, -10.4902), (-6.416408329, -10.4902))
            ThreePointArc((-6.416408329, -10.4902), (-7.41473083, -9.822813117), (-7.179650497, -8.645192506))
        make_face()
        Circle(SKETCH1_R, mode=Mode.SUBTRACT)
    extrude(amount=BOSS_EXTRUDE1_DEPTH, both=True)

    # Sketch2 → Cut-Extrude1 (cut)
    with BuildSketch(Plane(origin=(12.7, 0, 0), x_dir=(0, 0, -1), z_dir=(1, 0, 0))):
        with Locations((-631.537917207, -0.58573738)):
            Rectangle(SKETCH2_W, SKETCH2_H)
        with Locations((375.067711741, 0.118534447)):
            Rectangle(SKETCH2_W_2, SKETCH2_H_2)
    extrude(amount=-CUT_EXTRUDE1_DEPTH, mode=Mode.SUBTRACT)


solid = part.part
